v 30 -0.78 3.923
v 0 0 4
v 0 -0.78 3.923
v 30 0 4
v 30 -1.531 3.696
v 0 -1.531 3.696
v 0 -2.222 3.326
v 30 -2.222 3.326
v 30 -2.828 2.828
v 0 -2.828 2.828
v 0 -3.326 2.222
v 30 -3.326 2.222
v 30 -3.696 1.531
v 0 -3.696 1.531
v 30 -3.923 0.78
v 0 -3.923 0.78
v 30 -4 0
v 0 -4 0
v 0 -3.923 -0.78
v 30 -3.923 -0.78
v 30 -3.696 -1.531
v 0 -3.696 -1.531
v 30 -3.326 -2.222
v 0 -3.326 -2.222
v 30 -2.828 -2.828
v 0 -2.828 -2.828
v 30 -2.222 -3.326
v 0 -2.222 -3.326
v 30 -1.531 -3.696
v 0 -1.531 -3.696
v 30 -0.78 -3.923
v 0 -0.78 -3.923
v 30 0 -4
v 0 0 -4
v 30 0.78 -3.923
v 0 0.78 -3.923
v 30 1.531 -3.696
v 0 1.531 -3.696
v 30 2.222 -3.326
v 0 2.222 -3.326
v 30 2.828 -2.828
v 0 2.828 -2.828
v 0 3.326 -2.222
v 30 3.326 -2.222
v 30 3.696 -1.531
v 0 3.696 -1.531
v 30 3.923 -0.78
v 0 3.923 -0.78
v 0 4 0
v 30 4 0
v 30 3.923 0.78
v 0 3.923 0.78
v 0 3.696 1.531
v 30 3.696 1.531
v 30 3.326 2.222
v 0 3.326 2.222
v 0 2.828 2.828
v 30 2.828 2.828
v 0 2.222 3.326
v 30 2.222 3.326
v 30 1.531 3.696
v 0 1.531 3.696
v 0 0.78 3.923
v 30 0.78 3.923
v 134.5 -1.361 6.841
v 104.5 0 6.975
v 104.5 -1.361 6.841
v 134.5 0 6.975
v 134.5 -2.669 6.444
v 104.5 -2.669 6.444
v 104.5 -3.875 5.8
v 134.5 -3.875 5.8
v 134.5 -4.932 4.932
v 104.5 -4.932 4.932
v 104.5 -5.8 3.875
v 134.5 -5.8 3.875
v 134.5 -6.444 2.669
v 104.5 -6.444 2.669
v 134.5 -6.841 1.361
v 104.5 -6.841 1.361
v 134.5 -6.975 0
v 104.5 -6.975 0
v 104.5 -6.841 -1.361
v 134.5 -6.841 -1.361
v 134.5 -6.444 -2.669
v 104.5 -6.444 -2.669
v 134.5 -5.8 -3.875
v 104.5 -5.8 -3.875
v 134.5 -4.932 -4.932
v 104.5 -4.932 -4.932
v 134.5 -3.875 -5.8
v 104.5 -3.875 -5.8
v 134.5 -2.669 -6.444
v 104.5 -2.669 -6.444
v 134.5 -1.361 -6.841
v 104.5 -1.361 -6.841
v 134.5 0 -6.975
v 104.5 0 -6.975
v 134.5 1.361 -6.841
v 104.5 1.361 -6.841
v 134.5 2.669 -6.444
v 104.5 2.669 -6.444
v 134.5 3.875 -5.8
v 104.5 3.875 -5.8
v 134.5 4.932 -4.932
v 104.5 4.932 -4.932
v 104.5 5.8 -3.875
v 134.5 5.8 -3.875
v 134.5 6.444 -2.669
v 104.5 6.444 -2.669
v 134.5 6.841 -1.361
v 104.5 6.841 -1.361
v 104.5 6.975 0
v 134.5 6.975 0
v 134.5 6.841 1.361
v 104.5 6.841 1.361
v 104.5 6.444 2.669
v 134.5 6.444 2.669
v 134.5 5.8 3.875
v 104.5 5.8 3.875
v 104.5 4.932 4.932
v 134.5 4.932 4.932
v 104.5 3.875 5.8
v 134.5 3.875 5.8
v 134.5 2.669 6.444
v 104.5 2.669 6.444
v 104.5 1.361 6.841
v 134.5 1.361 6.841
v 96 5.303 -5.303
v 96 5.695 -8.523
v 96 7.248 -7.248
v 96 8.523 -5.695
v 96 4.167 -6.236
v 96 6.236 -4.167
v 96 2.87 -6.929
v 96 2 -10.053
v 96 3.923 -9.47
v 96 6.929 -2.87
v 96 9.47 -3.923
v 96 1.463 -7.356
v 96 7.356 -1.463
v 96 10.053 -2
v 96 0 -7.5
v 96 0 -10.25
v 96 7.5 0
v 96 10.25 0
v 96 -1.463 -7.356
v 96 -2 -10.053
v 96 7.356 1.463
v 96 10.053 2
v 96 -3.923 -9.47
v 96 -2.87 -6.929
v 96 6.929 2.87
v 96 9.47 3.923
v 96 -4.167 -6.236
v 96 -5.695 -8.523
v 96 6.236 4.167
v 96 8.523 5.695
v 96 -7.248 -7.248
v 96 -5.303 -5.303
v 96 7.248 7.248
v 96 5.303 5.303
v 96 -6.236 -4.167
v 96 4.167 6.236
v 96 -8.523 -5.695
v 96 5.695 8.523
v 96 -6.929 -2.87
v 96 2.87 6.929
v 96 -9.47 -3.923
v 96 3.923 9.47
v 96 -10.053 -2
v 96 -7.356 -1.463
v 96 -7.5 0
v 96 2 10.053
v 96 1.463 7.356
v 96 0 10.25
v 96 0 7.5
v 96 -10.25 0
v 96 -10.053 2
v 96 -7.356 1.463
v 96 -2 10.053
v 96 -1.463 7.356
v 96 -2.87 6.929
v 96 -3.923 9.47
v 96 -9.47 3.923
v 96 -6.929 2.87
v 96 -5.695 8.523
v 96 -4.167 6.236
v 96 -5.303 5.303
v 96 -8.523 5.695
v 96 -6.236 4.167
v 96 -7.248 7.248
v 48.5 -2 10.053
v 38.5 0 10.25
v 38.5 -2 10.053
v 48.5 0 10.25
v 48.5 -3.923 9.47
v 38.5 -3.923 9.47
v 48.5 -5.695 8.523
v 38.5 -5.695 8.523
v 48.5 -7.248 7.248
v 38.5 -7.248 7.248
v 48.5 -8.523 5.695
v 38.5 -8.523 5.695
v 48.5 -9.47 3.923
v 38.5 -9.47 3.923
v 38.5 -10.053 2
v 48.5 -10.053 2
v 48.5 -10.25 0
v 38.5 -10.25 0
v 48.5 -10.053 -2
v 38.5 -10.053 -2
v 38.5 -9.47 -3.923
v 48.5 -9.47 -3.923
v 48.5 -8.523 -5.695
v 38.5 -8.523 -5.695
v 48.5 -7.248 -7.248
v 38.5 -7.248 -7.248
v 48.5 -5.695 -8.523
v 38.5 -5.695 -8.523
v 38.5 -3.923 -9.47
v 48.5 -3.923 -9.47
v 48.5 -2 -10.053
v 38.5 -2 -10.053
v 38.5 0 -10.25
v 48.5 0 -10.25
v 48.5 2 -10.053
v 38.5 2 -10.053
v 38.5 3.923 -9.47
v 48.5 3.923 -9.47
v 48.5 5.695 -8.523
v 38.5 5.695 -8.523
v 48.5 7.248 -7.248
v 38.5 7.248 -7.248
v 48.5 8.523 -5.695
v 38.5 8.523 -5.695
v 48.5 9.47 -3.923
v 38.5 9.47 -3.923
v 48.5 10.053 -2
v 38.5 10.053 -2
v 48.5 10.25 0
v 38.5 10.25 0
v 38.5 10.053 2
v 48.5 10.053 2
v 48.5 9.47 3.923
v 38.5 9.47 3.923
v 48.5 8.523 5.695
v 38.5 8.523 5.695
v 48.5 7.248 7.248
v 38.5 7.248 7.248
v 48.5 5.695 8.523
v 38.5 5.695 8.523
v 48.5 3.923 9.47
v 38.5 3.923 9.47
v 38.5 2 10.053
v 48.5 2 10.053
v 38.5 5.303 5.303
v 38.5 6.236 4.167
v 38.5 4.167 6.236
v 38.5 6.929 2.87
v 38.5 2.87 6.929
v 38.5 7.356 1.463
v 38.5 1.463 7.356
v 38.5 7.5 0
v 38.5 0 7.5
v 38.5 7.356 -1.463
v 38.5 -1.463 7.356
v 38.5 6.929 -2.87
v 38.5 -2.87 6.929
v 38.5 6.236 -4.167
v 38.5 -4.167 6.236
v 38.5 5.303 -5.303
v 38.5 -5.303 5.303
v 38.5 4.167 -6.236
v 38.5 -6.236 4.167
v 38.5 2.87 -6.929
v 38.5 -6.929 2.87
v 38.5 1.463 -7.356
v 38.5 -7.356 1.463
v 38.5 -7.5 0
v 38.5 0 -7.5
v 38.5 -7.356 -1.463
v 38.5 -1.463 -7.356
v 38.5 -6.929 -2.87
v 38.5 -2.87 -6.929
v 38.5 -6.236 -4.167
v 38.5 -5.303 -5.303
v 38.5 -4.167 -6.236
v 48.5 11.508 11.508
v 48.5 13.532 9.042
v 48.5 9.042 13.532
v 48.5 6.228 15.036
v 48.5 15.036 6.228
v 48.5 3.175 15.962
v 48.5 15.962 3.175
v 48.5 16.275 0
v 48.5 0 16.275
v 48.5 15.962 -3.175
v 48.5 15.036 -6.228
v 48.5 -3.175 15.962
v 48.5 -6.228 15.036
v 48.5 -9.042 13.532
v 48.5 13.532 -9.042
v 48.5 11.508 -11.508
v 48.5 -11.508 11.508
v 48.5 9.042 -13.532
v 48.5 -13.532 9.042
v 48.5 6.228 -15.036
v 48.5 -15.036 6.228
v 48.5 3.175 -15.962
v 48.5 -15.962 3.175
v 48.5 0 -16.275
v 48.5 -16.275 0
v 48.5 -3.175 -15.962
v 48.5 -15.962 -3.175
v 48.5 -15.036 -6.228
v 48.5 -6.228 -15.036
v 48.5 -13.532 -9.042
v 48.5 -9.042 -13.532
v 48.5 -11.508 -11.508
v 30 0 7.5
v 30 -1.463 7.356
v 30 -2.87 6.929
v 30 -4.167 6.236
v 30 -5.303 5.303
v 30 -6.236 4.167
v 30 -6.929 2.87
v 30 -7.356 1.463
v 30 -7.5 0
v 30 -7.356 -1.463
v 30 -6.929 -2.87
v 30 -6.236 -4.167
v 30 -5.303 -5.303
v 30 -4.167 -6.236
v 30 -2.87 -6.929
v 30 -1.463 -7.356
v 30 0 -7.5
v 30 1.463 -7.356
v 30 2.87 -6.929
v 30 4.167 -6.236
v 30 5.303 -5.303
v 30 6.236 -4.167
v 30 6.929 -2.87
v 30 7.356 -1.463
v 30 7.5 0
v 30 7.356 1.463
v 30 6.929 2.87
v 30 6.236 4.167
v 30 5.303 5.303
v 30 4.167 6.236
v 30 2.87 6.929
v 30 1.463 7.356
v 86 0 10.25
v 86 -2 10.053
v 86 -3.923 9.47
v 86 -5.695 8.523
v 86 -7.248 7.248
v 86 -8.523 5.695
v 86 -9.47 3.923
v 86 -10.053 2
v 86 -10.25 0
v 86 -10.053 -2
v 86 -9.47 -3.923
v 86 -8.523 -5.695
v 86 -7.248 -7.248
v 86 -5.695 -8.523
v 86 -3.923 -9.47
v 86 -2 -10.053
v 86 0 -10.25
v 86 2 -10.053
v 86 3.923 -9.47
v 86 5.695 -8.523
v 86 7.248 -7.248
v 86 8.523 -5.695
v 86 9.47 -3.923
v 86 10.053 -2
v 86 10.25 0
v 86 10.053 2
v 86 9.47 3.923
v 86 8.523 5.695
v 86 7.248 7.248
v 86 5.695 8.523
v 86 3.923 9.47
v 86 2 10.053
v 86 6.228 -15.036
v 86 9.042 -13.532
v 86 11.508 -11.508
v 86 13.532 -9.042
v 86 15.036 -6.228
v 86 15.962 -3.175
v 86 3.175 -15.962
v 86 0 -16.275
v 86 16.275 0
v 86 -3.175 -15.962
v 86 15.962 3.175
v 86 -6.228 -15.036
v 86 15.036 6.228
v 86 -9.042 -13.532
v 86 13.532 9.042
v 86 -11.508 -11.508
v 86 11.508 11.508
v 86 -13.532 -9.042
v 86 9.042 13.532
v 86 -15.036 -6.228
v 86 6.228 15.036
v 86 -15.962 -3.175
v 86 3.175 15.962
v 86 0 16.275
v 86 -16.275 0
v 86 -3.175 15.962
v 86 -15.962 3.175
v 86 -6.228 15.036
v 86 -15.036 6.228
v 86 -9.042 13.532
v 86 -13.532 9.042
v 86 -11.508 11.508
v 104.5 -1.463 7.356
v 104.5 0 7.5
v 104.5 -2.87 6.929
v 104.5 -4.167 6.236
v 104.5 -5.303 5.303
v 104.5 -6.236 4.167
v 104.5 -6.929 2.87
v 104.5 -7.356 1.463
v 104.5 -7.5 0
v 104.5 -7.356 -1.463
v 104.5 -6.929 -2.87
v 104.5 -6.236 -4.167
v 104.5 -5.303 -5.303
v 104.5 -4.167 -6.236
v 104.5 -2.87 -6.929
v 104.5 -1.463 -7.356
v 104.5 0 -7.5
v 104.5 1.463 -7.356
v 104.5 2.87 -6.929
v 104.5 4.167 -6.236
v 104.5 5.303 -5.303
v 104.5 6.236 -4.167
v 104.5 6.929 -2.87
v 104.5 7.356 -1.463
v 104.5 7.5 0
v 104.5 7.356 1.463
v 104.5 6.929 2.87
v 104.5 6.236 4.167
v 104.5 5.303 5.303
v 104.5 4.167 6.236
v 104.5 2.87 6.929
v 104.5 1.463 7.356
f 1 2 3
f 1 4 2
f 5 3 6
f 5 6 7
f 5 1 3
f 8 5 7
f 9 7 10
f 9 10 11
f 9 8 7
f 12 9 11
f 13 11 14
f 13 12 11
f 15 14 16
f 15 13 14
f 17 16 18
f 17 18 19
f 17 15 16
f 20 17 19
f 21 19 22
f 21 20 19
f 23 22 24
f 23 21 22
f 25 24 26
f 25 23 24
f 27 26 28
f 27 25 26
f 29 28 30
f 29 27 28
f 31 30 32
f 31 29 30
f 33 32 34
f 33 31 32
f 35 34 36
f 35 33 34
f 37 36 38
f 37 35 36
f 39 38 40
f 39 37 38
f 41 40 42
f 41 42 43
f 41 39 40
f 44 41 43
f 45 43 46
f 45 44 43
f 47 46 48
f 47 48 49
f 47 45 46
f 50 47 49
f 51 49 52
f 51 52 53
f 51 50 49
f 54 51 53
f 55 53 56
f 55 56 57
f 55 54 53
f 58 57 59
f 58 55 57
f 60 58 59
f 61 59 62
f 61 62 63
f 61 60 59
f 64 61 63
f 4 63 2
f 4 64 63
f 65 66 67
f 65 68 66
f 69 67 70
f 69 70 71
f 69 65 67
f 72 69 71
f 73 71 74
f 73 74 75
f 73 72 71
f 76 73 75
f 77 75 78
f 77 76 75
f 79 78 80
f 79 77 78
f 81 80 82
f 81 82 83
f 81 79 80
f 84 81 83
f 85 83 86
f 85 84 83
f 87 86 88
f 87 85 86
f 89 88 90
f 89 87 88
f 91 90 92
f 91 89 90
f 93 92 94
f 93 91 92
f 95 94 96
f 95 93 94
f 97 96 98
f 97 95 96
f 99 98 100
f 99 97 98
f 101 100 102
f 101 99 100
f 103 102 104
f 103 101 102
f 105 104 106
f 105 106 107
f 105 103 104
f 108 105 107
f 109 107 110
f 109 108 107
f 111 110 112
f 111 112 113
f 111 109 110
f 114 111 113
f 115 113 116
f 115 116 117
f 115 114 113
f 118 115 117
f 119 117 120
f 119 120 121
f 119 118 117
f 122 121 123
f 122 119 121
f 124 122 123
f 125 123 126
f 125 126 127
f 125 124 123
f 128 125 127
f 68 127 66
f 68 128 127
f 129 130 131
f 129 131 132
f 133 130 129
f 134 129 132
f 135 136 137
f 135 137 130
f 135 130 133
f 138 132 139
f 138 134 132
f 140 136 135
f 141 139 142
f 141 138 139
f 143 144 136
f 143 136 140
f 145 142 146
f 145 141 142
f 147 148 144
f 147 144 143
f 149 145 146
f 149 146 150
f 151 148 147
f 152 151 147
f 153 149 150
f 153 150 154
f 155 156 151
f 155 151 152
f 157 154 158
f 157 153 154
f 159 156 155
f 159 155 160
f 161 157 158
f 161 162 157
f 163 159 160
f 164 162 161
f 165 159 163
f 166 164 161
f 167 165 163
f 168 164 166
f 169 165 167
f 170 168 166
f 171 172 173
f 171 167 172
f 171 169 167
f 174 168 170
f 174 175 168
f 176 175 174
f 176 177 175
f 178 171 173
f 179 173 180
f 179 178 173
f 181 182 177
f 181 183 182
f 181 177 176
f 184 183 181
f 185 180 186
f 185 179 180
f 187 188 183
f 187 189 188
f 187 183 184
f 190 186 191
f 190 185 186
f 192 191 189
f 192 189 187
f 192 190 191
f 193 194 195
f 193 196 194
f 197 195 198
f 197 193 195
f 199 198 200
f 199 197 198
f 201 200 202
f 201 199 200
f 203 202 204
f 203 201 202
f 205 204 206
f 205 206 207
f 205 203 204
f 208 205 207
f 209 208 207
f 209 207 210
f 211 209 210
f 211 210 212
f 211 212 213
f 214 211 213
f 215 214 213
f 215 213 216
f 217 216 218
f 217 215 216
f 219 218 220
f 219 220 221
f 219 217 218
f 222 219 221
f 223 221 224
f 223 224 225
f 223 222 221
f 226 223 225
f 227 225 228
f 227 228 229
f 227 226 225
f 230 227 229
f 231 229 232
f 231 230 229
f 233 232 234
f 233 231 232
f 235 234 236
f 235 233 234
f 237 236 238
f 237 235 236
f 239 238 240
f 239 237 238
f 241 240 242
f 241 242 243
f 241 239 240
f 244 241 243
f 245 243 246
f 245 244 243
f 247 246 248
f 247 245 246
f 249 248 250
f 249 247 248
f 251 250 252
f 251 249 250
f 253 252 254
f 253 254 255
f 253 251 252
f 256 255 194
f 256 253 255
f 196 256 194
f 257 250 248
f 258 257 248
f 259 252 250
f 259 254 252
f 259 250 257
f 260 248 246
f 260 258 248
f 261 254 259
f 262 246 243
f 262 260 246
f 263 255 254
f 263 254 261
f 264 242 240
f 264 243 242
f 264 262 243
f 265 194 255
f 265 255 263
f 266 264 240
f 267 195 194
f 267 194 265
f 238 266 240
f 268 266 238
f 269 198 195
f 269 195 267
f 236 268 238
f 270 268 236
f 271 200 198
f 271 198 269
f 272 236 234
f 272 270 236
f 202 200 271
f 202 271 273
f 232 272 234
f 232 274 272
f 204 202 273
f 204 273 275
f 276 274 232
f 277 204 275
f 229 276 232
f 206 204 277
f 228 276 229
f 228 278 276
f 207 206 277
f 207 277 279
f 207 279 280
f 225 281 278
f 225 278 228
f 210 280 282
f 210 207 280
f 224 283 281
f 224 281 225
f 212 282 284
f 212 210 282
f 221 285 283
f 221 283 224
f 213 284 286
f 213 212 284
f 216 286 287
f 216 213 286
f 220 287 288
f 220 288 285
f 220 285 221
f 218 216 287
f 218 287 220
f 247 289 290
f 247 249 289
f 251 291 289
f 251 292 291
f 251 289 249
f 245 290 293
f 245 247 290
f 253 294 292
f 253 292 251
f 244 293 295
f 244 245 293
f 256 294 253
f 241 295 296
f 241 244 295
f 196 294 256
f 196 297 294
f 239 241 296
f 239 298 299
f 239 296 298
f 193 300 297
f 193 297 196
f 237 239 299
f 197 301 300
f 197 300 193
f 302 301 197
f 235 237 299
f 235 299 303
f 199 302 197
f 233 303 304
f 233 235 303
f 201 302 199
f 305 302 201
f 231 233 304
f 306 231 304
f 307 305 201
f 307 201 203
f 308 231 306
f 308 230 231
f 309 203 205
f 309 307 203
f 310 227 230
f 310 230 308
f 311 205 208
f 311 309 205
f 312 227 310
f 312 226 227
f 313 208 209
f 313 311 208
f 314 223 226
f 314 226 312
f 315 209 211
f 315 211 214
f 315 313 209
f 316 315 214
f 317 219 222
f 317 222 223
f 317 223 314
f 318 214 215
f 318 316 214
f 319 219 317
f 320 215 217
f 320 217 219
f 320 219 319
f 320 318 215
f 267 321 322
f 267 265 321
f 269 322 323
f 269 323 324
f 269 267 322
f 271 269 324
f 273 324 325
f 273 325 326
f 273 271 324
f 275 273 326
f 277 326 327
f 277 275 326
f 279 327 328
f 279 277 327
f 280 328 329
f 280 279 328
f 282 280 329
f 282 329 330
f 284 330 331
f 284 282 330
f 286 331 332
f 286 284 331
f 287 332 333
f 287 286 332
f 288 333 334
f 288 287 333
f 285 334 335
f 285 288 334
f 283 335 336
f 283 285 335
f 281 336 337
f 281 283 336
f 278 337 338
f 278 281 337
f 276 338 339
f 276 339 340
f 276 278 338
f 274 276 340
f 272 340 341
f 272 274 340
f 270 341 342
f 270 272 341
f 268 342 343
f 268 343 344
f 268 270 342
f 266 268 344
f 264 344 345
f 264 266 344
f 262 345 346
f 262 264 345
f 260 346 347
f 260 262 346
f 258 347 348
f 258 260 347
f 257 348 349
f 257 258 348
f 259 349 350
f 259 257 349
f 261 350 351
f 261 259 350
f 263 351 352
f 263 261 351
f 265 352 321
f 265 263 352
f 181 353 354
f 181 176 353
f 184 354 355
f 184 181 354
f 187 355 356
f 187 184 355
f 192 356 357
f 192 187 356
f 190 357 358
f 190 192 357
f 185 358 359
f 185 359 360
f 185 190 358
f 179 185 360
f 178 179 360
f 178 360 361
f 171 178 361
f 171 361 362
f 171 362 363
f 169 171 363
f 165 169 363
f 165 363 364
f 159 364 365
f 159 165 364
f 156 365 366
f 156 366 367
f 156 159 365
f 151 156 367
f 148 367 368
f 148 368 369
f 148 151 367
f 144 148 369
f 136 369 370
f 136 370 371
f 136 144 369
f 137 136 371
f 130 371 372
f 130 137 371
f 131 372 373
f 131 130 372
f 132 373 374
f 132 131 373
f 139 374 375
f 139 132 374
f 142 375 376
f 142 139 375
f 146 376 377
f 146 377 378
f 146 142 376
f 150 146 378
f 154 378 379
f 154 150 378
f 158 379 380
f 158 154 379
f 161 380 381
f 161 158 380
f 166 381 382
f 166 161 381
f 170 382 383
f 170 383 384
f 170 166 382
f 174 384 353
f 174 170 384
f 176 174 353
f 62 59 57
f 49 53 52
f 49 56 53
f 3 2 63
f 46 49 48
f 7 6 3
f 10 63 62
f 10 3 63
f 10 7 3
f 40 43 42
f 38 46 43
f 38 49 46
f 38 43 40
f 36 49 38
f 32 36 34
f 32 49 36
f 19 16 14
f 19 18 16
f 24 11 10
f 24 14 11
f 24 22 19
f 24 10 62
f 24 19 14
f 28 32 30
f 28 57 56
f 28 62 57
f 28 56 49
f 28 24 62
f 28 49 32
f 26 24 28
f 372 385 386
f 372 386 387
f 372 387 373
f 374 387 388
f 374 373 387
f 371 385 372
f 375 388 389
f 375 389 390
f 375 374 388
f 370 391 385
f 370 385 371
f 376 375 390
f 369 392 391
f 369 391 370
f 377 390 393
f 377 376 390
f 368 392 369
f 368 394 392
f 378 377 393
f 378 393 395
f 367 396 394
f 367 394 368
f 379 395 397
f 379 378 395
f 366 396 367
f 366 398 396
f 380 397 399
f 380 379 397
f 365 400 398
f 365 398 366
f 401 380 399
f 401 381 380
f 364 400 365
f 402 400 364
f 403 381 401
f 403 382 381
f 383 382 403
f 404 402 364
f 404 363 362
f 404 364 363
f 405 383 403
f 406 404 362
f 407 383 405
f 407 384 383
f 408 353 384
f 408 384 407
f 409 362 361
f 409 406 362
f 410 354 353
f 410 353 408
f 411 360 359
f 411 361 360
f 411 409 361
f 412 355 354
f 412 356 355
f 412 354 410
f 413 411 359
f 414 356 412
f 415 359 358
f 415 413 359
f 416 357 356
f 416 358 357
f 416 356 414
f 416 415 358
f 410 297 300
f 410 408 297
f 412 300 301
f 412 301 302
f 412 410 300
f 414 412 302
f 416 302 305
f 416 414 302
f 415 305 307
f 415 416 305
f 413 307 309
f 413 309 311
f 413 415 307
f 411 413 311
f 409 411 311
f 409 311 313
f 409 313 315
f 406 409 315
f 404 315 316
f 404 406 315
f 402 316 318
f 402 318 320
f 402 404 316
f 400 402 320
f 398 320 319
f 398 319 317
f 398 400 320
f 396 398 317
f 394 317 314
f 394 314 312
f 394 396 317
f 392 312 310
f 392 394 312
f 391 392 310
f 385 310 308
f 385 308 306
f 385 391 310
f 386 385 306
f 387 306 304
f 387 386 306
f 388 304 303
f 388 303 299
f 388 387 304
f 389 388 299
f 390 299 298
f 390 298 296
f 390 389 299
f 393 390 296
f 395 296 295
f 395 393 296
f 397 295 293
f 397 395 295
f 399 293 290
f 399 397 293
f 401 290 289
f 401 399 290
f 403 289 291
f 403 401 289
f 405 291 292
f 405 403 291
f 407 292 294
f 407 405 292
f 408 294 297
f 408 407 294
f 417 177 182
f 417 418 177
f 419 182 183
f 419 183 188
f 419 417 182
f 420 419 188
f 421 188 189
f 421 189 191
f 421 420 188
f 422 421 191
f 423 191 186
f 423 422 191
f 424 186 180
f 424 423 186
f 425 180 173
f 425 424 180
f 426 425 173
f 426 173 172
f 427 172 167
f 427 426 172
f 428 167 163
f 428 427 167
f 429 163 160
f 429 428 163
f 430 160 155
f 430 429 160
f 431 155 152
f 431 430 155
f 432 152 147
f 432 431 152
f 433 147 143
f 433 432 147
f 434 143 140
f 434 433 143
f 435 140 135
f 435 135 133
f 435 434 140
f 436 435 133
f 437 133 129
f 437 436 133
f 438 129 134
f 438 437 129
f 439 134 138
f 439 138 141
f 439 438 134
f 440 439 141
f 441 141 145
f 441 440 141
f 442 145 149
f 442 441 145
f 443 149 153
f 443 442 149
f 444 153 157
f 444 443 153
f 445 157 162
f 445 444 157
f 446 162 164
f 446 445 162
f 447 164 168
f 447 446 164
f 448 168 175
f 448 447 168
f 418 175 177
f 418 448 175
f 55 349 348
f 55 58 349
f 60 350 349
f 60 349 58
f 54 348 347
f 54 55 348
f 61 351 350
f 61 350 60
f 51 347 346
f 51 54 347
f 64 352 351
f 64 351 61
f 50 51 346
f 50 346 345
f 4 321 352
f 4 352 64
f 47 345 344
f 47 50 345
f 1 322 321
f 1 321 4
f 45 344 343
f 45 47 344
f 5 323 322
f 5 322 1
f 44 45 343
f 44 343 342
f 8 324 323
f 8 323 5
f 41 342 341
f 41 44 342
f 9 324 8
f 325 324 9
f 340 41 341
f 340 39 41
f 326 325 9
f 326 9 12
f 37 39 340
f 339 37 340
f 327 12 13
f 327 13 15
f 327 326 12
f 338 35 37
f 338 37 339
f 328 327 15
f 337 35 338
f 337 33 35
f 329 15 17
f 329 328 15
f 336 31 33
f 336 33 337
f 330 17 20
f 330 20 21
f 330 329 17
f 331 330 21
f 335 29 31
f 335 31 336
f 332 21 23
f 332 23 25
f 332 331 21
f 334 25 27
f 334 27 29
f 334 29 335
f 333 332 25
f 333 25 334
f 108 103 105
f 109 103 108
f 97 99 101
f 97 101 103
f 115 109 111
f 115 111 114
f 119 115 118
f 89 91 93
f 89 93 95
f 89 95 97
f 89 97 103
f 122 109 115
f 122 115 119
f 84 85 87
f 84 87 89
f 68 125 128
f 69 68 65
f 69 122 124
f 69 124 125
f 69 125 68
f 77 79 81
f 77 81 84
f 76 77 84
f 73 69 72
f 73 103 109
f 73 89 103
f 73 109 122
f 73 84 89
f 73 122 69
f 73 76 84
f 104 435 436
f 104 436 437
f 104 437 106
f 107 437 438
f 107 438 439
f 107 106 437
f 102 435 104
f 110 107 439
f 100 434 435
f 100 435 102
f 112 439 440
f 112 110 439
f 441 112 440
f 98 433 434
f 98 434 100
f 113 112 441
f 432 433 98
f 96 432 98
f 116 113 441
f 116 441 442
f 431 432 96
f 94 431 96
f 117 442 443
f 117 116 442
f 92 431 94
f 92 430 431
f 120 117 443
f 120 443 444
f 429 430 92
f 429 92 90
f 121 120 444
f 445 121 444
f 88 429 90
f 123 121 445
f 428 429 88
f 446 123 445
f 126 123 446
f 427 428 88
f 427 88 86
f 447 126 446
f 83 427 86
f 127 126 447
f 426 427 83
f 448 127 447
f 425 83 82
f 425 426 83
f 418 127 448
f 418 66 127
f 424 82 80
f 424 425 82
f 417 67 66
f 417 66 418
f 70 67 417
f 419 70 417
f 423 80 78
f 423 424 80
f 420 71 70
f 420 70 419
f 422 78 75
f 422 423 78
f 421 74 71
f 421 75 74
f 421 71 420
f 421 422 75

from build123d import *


with BuildPart() as part:
    # Çizim1 → Döndür1 (revolve)
    with BuildSketch(Plane.XY, mode=Mode.PRIVATE) as d_nd_r1_sk:
        Polygon((30, 7.5), (38.5, 7.5), (38.5, 10.25), (48.5, 10.25), (48.5, 16.275), (86, 16.275), (86, 10.25), (96, 10.25), (96, 7.5), (104.5, 7.5), (104.5, 6.975), (134.5, 6.975), (134.5, 0), (0, 0), (0, 4), (30, 4), align=None)
    revolve(d_nd_r1_sk.sketch.rotate(Axis((0, 0, 0), (1, 0, 0)), 90), axis=Axis((0, 0, 0), (1, 0, 0)))


solid = part.part
